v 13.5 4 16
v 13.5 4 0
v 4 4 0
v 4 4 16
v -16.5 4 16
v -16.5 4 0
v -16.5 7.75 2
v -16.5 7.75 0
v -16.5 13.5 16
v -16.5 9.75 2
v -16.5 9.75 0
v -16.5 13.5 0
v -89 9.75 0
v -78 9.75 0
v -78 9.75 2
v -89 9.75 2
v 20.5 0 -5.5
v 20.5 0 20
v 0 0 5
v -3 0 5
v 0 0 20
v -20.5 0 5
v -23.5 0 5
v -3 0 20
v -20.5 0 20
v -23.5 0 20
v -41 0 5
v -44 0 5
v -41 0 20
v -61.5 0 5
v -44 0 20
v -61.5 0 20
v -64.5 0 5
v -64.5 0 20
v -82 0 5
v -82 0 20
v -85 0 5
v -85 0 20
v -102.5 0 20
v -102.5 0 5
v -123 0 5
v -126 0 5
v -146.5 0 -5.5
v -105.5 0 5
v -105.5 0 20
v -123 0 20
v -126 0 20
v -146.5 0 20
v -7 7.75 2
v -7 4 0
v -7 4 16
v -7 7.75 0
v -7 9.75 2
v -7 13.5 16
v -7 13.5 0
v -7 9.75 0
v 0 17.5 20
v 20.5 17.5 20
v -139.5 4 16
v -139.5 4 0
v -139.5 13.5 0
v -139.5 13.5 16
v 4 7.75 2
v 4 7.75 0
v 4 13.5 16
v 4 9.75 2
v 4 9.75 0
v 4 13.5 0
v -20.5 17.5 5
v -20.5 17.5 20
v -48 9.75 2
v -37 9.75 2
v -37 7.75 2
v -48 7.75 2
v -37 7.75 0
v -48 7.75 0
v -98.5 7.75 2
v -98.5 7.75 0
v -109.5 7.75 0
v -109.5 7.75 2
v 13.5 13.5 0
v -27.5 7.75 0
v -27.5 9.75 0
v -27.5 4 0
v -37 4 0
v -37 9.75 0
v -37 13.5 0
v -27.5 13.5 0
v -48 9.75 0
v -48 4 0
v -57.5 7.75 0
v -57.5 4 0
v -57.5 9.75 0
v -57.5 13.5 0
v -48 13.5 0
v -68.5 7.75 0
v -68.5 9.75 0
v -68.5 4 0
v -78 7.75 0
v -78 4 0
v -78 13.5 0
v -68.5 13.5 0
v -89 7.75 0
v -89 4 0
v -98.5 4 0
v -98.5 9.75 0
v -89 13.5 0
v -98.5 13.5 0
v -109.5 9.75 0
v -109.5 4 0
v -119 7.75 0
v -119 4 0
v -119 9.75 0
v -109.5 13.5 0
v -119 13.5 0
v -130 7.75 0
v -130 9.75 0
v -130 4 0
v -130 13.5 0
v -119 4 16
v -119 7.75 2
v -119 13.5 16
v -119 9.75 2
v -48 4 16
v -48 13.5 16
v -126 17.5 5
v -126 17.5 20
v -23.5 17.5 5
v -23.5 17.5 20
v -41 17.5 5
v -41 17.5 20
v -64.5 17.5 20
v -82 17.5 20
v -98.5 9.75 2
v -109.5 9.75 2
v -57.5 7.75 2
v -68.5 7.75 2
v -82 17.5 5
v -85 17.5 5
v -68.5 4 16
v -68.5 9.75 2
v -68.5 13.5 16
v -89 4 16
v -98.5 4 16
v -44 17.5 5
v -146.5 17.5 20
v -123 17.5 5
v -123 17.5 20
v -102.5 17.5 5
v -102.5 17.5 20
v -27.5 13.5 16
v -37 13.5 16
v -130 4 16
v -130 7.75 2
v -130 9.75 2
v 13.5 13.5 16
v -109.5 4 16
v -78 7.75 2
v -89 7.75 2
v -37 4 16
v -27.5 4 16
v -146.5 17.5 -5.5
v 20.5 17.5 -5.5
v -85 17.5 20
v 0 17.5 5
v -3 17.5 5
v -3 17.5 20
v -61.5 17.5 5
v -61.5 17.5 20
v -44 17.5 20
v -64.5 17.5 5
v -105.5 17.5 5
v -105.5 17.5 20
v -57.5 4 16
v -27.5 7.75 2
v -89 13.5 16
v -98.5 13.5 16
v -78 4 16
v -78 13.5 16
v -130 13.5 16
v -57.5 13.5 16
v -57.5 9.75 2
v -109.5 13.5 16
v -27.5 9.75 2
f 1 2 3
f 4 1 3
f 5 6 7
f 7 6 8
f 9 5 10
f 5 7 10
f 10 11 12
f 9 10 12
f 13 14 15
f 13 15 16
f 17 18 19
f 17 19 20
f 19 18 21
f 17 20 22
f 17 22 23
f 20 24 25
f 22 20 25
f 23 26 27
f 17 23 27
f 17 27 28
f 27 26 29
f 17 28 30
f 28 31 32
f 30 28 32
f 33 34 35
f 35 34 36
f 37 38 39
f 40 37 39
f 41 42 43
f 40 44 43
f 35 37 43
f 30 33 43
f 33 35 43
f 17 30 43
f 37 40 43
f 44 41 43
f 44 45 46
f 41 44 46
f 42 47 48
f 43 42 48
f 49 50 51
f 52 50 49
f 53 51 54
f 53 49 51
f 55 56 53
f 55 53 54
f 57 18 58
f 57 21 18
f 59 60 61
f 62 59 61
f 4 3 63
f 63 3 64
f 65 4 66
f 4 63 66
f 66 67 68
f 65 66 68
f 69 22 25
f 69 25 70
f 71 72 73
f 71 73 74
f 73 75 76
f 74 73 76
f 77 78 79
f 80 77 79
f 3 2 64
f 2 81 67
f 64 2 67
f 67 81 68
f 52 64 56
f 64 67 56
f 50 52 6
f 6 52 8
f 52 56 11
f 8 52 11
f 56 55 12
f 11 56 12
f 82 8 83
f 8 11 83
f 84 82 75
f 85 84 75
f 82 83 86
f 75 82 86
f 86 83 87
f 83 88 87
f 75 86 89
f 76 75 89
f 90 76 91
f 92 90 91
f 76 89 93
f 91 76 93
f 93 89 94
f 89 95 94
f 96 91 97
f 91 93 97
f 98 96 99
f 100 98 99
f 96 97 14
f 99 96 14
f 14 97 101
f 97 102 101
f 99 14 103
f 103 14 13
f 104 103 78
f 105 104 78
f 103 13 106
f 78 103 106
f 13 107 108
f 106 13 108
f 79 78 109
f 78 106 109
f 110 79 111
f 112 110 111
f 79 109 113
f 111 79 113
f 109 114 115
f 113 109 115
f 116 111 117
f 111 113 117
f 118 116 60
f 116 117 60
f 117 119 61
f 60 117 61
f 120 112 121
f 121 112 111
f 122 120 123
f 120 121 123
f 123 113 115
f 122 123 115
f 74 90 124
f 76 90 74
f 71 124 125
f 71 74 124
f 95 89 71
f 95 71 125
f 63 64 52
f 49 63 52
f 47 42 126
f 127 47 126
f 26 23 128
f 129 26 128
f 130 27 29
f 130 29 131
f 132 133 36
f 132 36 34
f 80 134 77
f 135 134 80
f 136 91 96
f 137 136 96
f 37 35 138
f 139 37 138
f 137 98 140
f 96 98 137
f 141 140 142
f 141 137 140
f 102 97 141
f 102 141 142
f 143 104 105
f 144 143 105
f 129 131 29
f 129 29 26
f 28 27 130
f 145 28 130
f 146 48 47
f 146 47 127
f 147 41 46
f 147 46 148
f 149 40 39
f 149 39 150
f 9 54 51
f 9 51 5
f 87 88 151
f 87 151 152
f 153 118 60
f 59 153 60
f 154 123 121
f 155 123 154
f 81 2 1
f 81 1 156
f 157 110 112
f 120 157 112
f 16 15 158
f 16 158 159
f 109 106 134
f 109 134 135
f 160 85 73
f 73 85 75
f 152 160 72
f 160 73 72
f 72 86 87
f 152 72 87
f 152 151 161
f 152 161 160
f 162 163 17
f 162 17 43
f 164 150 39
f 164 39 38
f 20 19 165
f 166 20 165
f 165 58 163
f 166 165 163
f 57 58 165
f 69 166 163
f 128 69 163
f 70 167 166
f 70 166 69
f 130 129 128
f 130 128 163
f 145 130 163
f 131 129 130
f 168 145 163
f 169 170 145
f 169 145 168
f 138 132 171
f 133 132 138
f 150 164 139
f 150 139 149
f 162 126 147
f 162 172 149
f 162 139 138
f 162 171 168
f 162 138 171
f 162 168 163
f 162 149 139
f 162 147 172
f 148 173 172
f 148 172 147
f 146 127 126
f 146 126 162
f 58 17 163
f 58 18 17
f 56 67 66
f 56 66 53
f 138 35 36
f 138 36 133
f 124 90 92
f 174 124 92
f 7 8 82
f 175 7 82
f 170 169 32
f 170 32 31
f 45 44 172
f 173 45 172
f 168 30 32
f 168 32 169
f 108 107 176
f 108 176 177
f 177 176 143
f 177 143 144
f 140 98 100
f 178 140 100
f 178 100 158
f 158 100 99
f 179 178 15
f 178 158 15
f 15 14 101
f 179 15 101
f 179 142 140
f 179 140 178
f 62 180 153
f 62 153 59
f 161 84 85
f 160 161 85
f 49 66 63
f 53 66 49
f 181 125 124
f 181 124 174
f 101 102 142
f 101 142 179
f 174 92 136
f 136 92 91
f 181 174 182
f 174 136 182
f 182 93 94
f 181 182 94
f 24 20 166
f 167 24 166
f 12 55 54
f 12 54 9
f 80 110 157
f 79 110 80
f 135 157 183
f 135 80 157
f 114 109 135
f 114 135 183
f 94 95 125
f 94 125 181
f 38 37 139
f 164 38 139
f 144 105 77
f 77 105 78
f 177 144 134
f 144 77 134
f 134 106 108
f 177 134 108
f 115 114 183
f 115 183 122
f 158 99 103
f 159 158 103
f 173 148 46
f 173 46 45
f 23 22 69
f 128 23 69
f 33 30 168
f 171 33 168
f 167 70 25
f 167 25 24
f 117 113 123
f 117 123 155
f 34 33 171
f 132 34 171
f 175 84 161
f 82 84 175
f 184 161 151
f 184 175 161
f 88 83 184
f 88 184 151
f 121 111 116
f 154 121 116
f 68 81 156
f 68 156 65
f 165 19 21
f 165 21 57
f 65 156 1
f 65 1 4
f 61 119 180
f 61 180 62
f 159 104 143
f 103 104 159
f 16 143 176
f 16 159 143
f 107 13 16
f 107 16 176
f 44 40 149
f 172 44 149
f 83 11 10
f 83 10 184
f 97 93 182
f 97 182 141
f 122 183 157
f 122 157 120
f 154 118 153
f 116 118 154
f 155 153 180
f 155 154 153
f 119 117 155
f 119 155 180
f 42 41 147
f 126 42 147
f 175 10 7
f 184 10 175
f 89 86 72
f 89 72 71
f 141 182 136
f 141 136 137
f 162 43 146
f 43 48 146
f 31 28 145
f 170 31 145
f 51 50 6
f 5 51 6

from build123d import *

# Parameters (mm, degrees)
SKETCH3_W           = 17.5
SKETCH3_H           = 17.5
BOSS_EXTRUDE2_DEPTH = 20
SKETCH4_W           = 9.5
SKETCH4_H           = 9.5
CUT_EXTRUDE1_DEPTH  = 16
SKETCH5_W           = 5
SKETCH5_H           = 17.5
BOSS_EXTRUDE3_DEPTH = 3
LPATTERN1_COUNT     = 8
LPATTERN1_PITCH     = 20.5
SKETCH6_W           = 15
SKETCH6_H           = 17.5
BOSS_EXTRUDE4_DEPTH = 3
SKETCH7_W           = 20
SKETCH7_H           = 17.5
BOSS_EXTRUDE5_DEPTH = 3
SKETCH8_W           = 134
SKETCH8_H           = 2
CUT_EXTRUDE2_DEPTH  = 2
SKETCH9_W           = 167
SKETCH9_H           = 17.5
BOSS_EXTRUDE6_DEPTH = 5.5


with BuildPart() as part:
    # Sketch3 → Boss-Extrude2 (new body)
    with BuildSketch(Plane.XY):
        with Locations((8.75, 8.75)):
            Rectangle(SKETCH3_W, SKETCH3_H)
    extrude(amount=BOSS_EXTRUDE2_DEPTH)

    # Sketch4 → Cut-Extrude1 (cut)
    with BuildSketch(Plane(origin=(0, 0, 0), x_dir=(-1, 0, 0), z_dir=(0, 0, -1))):
        with Locations((-8.75, 8.75)):
            Rectangle(SKETCH4_W, SKETCH4_H)
    extrude(amount=-CUT_EXTRUDE1_DEPTH, mode=Mode.SUBTRACT)

    # Sketch5 → Boss-Extrude3 (add)
    with BuildSketch(Plane.ZY):
        with Locations((2.5, 8.75)):
            Rectangle(SKETCH5_W, SKETCH5_H)
    extrude(amount=BOSS_EXTRUDE3_DEPTH)


with BuildPart() as lpattern1_1:
    # LPattern1: pattern copy
    add(part.part.moved(Location(Vector(-1, 0, 0) * (1 * LPATTERN1_PITCH))))


with BuildPart() as lpattern1_2:
    # LPattern1: pattern copy
    add(part.part.moved(Location(Vector(-1, 0, 0) * (2 * LPATTERN1_PITCH))))


with BuildPart() as lpattern1_3:
    # LPattern1: pattern copy
    add(part.part.moved(Location(Vector(-1, 0, 0) * (3 * LPATTERN1_PITCH))))


with BuildPart() as lpattern1_4:
    # LPattern1: pattern copy
    add(part.part.moved(Location(Vector(-1, 0, 0) * (4 * LPATTERN1_PITCH))))


with BuildPart() as lpattern1_5:
    # LPattern1: pattern copy
    add(part.part.moved(Location(Vector(-1, 0, 0) * (5 * LPATTERN1_PITCH))))


with BuildPart() as lpattern1_6:
    # LPattern1: pattern copy
    add(part.part.moved(Location(Vector(-1, 0, 0) * (6 * LPATTERN1_PITCH))))


with BuildPart() as lpattern1_7:
    # LPattern1: pattern copy
    add(part.part.moved(Location(Vector(-1, 0, 0) * (7 * LPATTERN1_PITCH))))


with BuildPart() as lpattern1_1_1:
    add(lpattern1_1.part)

    # Combine1: union LPattern1_2, LPattern1_3, part, LPattern1_4, LPattern1_5, LPattern1_6, LPattern1_7
    add(lpattern1_2.part)
    add(lpattern1_3.part)
    add(part.part)
    add(lpattern1_4.part)
    add(lpattern1_5.part)
    add(lpattern1_6.part)
    add(lpattern1_7.part)

    # Sketch6 → Boss-Extrude4 (add)
    with BuildSketch(Plane.ZY.offset(143.5)):
        with Locations((12.5, 8.75)):
            Rectangle(SKETCH6_W, SKETCH6_H)
    extrude(amount=BOSS_EXTRUDE4_DEPTH)

    # Sketch7 → Boss-Extrude5 (add)
    with BuildSketch(Plane(origin=(17.5, 0, 0), x_dir=(0, 0, -1), z_dir=(1, 0, 0))):
        with Locations((-10, 8.75)):
            Rectangle(SKETCH7_W, SKETCH7_H)
    extrude(amount=BOSS_EXTRUDE5_DEPTH)

    # Sketch8 → Cut-Extrude2 (cut)
    with BuildSketch(Plane(origin=(0, 0, 0), x_dir=(-1, 0, 0), z_dir=(0, 0, -1))):
        with Locations((63, 8.75)):
            Rectangle(SKETCH8_W, SKETCH8_H)
    extrude(amount=-CUT_EXTRUDE2_DEPTH, mode=Mode.SUBTRACT)

    # Sketch9 → Boss-Extrude6 (add)
    with BuildSketch(Plane(origin=(0, 0, 0), x_dir=(-1, 0, 0), z_dir=(0, 0, -1))):
        with Locations((63, 8.75)):
            Rectangle(SKETCH9_W, SKETCH9_H)
    extrude(amount=BOSS_EXTRUDE6_DEPTH)


solid = lpattern1_1_1.part
